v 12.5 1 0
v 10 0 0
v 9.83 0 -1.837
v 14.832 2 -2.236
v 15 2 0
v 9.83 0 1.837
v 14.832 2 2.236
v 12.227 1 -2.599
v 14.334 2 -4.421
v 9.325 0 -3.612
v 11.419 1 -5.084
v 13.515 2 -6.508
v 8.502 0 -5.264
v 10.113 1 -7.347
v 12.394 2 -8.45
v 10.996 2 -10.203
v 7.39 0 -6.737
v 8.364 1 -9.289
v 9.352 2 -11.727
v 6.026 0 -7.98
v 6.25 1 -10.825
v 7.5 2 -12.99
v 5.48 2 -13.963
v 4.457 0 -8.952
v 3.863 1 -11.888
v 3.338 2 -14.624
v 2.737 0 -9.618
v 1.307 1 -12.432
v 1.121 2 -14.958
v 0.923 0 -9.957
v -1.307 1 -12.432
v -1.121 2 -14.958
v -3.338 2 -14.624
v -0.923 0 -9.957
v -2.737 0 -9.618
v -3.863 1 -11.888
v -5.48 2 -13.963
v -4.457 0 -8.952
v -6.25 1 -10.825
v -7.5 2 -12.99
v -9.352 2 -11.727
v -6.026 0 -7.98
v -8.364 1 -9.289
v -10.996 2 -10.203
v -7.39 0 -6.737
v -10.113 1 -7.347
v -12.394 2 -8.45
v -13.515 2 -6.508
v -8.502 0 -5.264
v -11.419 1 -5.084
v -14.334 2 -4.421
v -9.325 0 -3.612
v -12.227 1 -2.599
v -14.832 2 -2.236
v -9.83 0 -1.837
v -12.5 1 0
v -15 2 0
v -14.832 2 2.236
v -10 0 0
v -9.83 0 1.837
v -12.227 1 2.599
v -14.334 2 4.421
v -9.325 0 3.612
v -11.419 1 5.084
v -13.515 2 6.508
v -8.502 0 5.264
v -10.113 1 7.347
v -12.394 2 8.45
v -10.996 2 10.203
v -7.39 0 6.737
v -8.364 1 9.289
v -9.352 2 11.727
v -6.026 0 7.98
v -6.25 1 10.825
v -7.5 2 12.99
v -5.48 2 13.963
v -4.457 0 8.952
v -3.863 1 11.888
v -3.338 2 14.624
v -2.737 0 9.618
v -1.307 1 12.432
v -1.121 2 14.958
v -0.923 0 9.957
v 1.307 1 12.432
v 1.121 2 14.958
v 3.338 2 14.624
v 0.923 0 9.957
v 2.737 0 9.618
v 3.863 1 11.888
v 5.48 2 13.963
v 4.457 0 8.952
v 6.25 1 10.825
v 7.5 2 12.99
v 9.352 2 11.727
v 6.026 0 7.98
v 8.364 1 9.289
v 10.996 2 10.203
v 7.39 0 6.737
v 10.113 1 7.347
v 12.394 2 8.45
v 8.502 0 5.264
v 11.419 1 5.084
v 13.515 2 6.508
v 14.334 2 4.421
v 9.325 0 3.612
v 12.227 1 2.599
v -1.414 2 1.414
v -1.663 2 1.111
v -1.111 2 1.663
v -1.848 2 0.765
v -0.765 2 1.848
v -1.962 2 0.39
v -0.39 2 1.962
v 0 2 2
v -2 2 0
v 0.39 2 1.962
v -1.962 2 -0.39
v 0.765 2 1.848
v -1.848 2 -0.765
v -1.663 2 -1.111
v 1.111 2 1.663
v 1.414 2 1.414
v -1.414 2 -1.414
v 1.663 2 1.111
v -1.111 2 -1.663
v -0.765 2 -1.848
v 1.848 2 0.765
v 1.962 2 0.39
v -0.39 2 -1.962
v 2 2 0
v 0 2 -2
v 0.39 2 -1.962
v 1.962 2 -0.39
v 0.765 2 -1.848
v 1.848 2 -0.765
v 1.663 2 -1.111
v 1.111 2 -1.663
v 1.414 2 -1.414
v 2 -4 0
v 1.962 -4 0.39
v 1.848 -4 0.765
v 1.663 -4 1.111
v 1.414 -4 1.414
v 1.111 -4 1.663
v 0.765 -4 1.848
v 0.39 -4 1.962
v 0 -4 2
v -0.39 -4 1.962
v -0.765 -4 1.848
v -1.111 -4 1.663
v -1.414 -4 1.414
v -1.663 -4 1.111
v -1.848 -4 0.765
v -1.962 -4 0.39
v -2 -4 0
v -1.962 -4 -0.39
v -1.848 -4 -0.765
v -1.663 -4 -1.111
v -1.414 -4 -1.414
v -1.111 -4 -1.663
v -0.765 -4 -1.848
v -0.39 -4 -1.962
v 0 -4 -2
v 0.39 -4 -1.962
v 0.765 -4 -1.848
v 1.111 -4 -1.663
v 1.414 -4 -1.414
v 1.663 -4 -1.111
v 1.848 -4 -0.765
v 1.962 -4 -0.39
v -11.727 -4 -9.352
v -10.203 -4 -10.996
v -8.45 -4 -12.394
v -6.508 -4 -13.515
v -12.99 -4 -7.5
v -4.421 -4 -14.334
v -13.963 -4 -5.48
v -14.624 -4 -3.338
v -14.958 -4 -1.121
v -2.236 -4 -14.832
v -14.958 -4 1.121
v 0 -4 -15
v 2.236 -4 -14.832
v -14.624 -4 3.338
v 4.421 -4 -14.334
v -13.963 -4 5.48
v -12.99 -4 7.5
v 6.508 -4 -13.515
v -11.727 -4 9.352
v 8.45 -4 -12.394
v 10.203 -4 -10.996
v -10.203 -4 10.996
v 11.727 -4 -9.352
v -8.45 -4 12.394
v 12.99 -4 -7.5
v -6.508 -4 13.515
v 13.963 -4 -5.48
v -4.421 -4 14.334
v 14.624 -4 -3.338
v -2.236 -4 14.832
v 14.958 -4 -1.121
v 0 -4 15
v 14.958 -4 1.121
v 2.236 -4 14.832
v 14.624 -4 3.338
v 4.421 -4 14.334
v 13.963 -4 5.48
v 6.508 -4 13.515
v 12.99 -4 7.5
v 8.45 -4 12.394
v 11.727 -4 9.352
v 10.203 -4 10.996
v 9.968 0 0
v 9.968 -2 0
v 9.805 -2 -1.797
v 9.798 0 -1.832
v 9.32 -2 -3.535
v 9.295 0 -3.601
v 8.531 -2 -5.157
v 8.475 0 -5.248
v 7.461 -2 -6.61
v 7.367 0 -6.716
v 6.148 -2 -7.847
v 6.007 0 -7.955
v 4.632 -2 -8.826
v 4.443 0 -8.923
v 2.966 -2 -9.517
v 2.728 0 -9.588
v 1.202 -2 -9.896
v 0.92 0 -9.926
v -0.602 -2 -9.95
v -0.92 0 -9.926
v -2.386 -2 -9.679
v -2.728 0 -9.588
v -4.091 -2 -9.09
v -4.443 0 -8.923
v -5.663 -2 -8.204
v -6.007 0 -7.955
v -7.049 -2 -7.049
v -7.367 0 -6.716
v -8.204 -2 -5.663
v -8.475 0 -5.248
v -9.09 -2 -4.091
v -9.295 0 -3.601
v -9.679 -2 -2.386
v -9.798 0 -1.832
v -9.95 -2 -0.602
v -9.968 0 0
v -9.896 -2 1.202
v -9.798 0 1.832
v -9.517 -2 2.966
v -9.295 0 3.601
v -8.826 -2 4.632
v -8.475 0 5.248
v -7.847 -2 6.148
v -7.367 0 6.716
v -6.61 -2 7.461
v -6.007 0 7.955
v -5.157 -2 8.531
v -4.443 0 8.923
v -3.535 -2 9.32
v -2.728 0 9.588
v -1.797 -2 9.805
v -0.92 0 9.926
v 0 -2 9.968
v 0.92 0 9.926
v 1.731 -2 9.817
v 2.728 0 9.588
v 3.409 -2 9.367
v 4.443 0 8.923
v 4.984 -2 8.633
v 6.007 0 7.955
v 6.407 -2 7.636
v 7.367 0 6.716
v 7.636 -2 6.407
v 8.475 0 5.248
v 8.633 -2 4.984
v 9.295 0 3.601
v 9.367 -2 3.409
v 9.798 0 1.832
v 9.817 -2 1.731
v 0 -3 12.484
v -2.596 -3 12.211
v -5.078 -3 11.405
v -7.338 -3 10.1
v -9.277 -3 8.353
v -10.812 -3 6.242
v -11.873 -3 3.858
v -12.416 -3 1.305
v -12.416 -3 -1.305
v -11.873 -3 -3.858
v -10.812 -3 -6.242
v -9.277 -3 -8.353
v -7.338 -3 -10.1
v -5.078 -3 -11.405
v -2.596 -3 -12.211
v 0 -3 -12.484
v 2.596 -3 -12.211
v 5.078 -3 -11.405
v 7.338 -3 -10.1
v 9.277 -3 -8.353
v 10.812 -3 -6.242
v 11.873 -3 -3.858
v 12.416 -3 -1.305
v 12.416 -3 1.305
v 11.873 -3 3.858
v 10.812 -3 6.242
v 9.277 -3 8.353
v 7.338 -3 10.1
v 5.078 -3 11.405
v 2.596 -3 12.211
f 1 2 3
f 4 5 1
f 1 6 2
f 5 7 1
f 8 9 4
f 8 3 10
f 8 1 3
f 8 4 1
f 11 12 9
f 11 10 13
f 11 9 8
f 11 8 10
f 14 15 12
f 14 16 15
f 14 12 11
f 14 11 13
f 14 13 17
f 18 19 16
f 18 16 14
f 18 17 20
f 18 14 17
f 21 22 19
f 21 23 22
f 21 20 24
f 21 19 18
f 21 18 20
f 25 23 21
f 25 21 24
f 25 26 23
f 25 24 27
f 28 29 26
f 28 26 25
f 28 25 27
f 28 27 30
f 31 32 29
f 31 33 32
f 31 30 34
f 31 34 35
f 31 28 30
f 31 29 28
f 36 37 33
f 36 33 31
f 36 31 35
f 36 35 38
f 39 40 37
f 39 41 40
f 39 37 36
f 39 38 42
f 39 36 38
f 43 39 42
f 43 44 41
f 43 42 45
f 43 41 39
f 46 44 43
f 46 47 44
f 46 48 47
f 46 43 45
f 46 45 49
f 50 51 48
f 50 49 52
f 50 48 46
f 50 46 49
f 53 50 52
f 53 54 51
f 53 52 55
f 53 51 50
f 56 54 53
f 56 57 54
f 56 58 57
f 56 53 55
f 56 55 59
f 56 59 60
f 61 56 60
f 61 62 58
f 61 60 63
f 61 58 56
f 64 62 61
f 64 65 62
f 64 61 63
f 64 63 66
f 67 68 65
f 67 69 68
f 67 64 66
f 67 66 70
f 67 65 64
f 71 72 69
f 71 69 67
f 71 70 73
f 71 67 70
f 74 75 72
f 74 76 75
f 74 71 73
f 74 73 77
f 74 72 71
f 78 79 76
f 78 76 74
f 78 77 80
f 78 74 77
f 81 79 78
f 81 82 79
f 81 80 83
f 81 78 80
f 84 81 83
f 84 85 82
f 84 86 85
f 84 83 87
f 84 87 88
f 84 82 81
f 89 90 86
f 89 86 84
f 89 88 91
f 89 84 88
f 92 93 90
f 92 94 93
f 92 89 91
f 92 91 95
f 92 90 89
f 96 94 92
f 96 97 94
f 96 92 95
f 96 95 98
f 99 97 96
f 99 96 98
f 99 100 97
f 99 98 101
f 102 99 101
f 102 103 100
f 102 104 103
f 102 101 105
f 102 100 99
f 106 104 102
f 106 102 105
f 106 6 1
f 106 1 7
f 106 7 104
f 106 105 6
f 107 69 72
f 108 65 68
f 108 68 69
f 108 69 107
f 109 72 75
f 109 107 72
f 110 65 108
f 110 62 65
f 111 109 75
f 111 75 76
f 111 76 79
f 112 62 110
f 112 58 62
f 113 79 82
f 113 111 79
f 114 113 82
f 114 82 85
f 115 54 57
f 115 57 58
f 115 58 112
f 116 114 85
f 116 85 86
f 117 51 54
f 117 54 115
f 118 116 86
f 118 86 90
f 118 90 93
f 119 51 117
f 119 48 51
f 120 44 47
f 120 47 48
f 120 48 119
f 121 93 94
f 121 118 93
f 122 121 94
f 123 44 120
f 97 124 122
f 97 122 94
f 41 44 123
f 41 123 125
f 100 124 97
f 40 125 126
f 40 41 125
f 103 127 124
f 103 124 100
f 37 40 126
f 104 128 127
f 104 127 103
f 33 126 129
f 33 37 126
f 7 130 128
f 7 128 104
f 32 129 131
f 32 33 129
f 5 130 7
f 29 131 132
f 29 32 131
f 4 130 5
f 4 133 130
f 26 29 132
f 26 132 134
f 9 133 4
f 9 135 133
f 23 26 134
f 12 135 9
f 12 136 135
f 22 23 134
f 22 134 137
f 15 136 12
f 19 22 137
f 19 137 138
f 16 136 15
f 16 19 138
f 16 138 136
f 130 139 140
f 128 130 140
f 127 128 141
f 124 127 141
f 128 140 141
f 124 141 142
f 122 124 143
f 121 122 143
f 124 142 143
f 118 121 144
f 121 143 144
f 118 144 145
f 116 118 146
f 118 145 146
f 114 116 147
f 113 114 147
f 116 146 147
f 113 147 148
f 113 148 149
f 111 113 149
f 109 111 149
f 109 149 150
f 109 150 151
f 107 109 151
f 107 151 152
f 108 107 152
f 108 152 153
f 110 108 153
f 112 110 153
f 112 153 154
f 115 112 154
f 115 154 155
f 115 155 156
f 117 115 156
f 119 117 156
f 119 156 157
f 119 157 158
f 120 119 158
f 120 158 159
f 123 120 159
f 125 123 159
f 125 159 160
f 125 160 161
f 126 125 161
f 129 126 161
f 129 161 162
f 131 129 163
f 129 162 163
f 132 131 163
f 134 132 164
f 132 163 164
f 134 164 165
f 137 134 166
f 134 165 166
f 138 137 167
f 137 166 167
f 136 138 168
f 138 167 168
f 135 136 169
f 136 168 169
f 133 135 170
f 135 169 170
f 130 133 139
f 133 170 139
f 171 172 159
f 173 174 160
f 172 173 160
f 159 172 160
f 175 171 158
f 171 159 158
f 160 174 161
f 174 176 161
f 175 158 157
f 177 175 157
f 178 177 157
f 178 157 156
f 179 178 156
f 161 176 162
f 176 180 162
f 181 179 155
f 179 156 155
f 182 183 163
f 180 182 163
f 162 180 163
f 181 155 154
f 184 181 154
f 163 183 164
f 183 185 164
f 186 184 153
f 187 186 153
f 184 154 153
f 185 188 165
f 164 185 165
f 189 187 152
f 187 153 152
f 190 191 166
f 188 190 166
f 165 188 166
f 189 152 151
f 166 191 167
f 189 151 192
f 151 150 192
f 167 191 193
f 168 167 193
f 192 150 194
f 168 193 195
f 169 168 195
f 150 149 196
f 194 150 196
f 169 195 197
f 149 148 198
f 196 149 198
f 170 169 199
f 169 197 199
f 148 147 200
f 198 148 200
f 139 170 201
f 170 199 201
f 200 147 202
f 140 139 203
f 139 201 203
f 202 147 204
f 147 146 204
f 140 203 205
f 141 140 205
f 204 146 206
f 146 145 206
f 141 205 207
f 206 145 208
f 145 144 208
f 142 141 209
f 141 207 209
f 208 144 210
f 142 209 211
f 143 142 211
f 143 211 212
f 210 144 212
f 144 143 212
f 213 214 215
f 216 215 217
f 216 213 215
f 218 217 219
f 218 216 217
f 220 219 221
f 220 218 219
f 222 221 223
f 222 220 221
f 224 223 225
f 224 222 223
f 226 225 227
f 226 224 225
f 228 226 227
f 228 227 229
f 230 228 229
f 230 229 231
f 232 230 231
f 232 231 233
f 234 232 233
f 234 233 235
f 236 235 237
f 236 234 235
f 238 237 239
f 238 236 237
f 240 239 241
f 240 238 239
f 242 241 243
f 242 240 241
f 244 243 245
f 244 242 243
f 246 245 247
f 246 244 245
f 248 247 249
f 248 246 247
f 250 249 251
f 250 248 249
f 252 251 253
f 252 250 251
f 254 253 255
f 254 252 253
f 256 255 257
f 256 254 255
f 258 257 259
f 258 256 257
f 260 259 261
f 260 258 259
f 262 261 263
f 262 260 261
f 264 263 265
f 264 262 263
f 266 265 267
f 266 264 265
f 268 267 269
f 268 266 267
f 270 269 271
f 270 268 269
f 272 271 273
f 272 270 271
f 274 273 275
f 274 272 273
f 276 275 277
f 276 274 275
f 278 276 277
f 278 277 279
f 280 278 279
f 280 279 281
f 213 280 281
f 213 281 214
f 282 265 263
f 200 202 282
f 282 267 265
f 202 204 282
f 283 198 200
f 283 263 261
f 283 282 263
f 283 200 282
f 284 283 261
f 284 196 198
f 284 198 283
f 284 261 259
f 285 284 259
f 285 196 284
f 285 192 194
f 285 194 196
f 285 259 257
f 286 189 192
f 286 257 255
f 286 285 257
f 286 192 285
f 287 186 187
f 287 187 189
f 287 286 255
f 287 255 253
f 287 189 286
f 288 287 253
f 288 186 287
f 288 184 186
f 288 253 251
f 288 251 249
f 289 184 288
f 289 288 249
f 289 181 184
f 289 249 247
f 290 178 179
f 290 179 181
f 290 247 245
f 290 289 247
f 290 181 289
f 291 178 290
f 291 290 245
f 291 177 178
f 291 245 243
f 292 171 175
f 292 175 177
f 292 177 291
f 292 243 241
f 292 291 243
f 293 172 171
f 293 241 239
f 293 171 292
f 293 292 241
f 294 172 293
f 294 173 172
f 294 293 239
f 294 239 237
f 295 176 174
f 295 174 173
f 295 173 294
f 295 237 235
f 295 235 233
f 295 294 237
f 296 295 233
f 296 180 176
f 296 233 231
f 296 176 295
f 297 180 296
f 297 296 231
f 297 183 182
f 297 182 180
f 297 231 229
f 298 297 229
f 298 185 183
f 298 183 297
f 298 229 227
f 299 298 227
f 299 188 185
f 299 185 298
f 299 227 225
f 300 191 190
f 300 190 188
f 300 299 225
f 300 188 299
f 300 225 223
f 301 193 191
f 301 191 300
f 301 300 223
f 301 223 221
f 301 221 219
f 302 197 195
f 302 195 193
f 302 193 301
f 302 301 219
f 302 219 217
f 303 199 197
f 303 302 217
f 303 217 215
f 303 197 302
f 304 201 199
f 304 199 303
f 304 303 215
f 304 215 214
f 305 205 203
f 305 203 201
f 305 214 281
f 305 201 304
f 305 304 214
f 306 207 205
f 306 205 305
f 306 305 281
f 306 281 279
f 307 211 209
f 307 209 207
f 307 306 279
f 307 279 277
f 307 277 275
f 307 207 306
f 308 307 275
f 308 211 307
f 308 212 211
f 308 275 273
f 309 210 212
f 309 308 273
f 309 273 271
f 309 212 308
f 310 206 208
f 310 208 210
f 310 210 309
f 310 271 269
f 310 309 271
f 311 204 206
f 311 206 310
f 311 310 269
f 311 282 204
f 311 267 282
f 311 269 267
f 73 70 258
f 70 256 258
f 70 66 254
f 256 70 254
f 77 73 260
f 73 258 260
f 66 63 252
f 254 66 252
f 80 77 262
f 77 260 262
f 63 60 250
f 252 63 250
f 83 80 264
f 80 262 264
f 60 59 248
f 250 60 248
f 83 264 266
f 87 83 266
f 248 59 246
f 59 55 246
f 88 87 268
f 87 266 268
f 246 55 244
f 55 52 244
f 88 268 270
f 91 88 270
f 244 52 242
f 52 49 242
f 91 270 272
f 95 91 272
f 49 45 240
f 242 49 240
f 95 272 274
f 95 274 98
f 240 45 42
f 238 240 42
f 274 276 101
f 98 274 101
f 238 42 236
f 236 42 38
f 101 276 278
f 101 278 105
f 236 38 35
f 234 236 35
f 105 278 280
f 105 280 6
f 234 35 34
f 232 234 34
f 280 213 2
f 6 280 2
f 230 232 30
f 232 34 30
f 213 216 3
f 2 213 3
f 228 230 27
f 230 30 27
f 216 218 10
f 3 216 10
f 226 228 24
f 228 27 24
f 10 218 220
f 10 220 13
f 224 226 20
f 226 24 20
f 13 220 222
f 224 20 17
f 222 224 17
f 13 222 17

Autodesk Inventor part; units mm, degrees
ref_plane "YZ Plane" through (0, 0, 0) normal (1, 0, 0) x (0, 1, 0)
ref_plane "XZ Plane" through (0, 0, 0) normal (0, 1, 0) x (-1, 0, 0)
ref_plane "XY Plane" through (0, 0, 0) normal (0, 0, 1) x (1, 0, 0)
sketch "Esquisse1" plane through (0, 0, 0) normal (0, 0, 1) x (1, 0, 0)
  line L0 (0, 0) -> (0, 2)
  line L1 (0, 2) -> (15, 2)
  line L2 (15, 2) -> (10, 0)
  line L3 (10, 0) -> (0, 0)
  line L4 (0, 0) -> (3.6066, 0) construction
  dimension "d0" = 2
  dimension "d1" = 10
  dimension "d2" = 15
revolve "Révolution1" add sketch "Esquisse1" angle 360 about axis through (0, 0, 0) along (0, 1, 0)
sketch "Esquisse2" plane through (0, 0, 0) normal (0, -1, 0) x (1, 0, 0)
  circle A0 centre (0, 0) radius 9.9682
extrude "Extrusion1" add sketch "Esquisse2" along normal blind 2
sketch "Esquisse3" plane through (0, 0, 0) normal (1, 0, 0) x (0, 1, 0)
  line L0 (-2, 9.9682) -> (-2, -9.9682) projected
  line L1 (-2, 0) -> (-2, 9.9682)
  line L2 (-2, 9.9682) -> (-4, 15)
  line L3 (-4, 15) -> (-4, 0)
  line L4 (-4, 0) -> (-2, 0)
  point P0 (0, 0)
  dimension "d6" = 2
  dimension "d7" = 15
revolve "Révolution2" add sketch "Esquisse3" angle 360 about axis through (0, -4, 0) along (0, 1, 0)
sketch "Esquisse4" plane through (0, -4, 0) normal (0, -1, 0) x (1, 0, 0)
  circle A0 centre (0, 0) radius 2
  dimension "d9" = 4
extrude "Extrusion2" cut sketch "Esquisse4" against normal blind 6
properties part number "Hand polley" material "Plastique ABS"
